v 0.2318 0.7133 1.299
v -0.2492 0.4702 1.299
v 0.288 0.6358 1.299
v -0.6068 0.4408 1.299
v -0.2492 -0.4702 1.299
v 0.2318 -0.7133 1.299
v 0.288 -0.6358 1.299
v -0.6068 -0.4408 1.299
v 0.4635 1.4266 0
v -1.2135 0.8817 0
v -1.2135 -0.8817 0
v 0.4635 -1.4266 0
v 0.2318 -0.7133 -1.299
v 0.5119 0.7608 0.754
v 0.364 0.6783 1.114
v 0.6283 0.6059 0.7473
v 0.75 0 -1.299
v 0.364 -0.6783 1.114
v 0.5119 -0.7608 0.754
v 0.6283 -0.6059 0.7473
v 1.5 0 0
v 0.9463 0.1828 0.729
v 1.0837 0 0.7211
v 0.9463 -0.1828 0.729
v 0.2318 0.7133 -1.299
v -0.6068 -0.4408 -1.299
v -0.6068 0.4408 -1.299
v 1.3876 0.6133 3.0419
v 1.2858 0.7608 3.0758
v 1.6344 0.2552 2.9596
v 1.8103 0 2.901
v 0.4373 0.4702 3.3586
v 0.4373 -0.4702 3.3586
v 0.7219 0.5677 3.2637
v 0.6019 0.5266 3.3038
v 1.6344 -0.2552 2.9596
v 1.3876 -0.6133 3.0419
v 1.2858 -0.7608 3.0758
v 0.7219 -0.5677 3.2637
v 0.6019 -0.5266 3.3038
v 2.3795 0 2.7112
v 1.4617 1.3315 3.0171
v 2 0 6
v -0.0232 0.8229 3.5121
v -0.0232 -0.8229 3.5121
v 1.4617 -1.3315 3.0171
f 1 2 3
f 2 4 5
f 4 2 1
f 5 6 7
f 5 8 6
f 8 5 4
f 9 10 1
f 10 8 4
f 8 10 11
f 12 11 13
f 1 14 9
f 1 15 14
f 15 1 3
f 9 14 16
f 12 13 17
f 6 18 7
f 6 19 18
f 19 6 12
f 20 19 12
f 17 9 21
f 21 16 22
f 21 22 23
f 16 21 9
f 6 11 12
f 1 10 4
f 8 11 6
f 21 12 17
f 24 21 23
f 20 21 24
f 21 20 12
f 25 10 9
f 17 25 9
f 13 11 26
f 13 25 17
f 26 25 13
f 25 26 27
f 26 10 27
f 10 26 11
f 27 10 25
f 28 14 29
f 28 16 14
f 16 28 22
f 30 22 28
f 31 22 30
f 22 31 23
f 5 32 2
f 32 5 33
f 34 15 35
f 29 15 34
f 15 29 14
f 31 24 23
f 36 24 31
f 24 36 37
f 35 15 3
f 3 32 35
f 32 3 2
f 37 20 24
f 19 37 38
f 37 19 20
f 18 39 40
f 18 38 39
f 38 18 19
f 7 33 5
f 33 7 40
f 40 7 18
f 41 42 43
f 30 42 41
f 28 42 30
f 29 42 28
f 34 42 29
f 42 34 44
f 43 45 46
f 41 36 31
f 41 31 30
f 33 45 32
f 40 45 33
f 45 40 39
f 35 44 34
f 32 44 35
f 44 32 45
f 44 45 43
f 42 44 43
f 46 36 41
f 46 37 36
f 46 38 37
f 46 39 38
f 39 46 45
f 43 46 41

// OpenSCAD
// Parameters
radial_x = 2; //[1:4:0.1]
radial_y = 0; //[-2:2:0.1]
radial_z = 6; //[3:12:0.1]
origin_radius = 1.5; //[0.75:3:0.1]
shaft_radius = 0.8; //[0.4:1.6:0.1]
head_radius = 1.4; //[0.7:2.8:0.1]
head_length = 3; //[1.5:6:0.1]
overlap = 0.8; //[0.5:2:0.1]

// Calculate derived values
vector_length = sqrt(radial_x*radial_x + radial_y*radial_y + radial_z*radial_z);
shaft_length = vector_length - head_length + overlap;
shaft_translate_factor = shaft_length / (2 * vector_length);
head_translate_factor = 1 - (head_length / (2 * vector_length));

// Rotation angles
shaft_rot_y_angle = acos(radial_z / vector_length);
shaft_rot_z_angle = atan2(radial_y, radial_x);

// Geometry
module radial_vector_origin_sphere() {
  color("Silver")
  sphere(r=origin_radius, center=true);
}

module radial_vector_shaft_cyl() {
  color("DimGray")
  cylinder(h=shaft_length, r=shaft_radius, center=true);
}

module radial_vector_head_cone() {
  color("DimGray")
  cylinder(h=head_length, r1=head_radius, r2=0, center=true);
}

// Operations
module radial_vector_shaft() {
  translate([
    radial_x * shaft_translate_factor,
    radial_y * shaft_translate_factor,
    radial_z * shaft_translate_factor
  ])
  rotate([0, shaft_rot_y_angle, shaft_rot_z_angle])
  radial_vector_shaft_cyl();
}

module radial_vector_head() {
  translate([
    radial_x * head_translate_factor,
    radial_y * head_translate_factor,
    radial_z * head_translate_factor
  ])
  rotate([0, shaft_rot_y_angle, shaft_rot_z_angle])
  radial_vector_head_cone();
}

// Final assembly
module radial_vector_definition() {
  union() {
    radial_vector_origin_sphere();
    radial_vector_shaft();
    radial_vector_head();
  }
}

// Render the final output
radial_vector_definition();
